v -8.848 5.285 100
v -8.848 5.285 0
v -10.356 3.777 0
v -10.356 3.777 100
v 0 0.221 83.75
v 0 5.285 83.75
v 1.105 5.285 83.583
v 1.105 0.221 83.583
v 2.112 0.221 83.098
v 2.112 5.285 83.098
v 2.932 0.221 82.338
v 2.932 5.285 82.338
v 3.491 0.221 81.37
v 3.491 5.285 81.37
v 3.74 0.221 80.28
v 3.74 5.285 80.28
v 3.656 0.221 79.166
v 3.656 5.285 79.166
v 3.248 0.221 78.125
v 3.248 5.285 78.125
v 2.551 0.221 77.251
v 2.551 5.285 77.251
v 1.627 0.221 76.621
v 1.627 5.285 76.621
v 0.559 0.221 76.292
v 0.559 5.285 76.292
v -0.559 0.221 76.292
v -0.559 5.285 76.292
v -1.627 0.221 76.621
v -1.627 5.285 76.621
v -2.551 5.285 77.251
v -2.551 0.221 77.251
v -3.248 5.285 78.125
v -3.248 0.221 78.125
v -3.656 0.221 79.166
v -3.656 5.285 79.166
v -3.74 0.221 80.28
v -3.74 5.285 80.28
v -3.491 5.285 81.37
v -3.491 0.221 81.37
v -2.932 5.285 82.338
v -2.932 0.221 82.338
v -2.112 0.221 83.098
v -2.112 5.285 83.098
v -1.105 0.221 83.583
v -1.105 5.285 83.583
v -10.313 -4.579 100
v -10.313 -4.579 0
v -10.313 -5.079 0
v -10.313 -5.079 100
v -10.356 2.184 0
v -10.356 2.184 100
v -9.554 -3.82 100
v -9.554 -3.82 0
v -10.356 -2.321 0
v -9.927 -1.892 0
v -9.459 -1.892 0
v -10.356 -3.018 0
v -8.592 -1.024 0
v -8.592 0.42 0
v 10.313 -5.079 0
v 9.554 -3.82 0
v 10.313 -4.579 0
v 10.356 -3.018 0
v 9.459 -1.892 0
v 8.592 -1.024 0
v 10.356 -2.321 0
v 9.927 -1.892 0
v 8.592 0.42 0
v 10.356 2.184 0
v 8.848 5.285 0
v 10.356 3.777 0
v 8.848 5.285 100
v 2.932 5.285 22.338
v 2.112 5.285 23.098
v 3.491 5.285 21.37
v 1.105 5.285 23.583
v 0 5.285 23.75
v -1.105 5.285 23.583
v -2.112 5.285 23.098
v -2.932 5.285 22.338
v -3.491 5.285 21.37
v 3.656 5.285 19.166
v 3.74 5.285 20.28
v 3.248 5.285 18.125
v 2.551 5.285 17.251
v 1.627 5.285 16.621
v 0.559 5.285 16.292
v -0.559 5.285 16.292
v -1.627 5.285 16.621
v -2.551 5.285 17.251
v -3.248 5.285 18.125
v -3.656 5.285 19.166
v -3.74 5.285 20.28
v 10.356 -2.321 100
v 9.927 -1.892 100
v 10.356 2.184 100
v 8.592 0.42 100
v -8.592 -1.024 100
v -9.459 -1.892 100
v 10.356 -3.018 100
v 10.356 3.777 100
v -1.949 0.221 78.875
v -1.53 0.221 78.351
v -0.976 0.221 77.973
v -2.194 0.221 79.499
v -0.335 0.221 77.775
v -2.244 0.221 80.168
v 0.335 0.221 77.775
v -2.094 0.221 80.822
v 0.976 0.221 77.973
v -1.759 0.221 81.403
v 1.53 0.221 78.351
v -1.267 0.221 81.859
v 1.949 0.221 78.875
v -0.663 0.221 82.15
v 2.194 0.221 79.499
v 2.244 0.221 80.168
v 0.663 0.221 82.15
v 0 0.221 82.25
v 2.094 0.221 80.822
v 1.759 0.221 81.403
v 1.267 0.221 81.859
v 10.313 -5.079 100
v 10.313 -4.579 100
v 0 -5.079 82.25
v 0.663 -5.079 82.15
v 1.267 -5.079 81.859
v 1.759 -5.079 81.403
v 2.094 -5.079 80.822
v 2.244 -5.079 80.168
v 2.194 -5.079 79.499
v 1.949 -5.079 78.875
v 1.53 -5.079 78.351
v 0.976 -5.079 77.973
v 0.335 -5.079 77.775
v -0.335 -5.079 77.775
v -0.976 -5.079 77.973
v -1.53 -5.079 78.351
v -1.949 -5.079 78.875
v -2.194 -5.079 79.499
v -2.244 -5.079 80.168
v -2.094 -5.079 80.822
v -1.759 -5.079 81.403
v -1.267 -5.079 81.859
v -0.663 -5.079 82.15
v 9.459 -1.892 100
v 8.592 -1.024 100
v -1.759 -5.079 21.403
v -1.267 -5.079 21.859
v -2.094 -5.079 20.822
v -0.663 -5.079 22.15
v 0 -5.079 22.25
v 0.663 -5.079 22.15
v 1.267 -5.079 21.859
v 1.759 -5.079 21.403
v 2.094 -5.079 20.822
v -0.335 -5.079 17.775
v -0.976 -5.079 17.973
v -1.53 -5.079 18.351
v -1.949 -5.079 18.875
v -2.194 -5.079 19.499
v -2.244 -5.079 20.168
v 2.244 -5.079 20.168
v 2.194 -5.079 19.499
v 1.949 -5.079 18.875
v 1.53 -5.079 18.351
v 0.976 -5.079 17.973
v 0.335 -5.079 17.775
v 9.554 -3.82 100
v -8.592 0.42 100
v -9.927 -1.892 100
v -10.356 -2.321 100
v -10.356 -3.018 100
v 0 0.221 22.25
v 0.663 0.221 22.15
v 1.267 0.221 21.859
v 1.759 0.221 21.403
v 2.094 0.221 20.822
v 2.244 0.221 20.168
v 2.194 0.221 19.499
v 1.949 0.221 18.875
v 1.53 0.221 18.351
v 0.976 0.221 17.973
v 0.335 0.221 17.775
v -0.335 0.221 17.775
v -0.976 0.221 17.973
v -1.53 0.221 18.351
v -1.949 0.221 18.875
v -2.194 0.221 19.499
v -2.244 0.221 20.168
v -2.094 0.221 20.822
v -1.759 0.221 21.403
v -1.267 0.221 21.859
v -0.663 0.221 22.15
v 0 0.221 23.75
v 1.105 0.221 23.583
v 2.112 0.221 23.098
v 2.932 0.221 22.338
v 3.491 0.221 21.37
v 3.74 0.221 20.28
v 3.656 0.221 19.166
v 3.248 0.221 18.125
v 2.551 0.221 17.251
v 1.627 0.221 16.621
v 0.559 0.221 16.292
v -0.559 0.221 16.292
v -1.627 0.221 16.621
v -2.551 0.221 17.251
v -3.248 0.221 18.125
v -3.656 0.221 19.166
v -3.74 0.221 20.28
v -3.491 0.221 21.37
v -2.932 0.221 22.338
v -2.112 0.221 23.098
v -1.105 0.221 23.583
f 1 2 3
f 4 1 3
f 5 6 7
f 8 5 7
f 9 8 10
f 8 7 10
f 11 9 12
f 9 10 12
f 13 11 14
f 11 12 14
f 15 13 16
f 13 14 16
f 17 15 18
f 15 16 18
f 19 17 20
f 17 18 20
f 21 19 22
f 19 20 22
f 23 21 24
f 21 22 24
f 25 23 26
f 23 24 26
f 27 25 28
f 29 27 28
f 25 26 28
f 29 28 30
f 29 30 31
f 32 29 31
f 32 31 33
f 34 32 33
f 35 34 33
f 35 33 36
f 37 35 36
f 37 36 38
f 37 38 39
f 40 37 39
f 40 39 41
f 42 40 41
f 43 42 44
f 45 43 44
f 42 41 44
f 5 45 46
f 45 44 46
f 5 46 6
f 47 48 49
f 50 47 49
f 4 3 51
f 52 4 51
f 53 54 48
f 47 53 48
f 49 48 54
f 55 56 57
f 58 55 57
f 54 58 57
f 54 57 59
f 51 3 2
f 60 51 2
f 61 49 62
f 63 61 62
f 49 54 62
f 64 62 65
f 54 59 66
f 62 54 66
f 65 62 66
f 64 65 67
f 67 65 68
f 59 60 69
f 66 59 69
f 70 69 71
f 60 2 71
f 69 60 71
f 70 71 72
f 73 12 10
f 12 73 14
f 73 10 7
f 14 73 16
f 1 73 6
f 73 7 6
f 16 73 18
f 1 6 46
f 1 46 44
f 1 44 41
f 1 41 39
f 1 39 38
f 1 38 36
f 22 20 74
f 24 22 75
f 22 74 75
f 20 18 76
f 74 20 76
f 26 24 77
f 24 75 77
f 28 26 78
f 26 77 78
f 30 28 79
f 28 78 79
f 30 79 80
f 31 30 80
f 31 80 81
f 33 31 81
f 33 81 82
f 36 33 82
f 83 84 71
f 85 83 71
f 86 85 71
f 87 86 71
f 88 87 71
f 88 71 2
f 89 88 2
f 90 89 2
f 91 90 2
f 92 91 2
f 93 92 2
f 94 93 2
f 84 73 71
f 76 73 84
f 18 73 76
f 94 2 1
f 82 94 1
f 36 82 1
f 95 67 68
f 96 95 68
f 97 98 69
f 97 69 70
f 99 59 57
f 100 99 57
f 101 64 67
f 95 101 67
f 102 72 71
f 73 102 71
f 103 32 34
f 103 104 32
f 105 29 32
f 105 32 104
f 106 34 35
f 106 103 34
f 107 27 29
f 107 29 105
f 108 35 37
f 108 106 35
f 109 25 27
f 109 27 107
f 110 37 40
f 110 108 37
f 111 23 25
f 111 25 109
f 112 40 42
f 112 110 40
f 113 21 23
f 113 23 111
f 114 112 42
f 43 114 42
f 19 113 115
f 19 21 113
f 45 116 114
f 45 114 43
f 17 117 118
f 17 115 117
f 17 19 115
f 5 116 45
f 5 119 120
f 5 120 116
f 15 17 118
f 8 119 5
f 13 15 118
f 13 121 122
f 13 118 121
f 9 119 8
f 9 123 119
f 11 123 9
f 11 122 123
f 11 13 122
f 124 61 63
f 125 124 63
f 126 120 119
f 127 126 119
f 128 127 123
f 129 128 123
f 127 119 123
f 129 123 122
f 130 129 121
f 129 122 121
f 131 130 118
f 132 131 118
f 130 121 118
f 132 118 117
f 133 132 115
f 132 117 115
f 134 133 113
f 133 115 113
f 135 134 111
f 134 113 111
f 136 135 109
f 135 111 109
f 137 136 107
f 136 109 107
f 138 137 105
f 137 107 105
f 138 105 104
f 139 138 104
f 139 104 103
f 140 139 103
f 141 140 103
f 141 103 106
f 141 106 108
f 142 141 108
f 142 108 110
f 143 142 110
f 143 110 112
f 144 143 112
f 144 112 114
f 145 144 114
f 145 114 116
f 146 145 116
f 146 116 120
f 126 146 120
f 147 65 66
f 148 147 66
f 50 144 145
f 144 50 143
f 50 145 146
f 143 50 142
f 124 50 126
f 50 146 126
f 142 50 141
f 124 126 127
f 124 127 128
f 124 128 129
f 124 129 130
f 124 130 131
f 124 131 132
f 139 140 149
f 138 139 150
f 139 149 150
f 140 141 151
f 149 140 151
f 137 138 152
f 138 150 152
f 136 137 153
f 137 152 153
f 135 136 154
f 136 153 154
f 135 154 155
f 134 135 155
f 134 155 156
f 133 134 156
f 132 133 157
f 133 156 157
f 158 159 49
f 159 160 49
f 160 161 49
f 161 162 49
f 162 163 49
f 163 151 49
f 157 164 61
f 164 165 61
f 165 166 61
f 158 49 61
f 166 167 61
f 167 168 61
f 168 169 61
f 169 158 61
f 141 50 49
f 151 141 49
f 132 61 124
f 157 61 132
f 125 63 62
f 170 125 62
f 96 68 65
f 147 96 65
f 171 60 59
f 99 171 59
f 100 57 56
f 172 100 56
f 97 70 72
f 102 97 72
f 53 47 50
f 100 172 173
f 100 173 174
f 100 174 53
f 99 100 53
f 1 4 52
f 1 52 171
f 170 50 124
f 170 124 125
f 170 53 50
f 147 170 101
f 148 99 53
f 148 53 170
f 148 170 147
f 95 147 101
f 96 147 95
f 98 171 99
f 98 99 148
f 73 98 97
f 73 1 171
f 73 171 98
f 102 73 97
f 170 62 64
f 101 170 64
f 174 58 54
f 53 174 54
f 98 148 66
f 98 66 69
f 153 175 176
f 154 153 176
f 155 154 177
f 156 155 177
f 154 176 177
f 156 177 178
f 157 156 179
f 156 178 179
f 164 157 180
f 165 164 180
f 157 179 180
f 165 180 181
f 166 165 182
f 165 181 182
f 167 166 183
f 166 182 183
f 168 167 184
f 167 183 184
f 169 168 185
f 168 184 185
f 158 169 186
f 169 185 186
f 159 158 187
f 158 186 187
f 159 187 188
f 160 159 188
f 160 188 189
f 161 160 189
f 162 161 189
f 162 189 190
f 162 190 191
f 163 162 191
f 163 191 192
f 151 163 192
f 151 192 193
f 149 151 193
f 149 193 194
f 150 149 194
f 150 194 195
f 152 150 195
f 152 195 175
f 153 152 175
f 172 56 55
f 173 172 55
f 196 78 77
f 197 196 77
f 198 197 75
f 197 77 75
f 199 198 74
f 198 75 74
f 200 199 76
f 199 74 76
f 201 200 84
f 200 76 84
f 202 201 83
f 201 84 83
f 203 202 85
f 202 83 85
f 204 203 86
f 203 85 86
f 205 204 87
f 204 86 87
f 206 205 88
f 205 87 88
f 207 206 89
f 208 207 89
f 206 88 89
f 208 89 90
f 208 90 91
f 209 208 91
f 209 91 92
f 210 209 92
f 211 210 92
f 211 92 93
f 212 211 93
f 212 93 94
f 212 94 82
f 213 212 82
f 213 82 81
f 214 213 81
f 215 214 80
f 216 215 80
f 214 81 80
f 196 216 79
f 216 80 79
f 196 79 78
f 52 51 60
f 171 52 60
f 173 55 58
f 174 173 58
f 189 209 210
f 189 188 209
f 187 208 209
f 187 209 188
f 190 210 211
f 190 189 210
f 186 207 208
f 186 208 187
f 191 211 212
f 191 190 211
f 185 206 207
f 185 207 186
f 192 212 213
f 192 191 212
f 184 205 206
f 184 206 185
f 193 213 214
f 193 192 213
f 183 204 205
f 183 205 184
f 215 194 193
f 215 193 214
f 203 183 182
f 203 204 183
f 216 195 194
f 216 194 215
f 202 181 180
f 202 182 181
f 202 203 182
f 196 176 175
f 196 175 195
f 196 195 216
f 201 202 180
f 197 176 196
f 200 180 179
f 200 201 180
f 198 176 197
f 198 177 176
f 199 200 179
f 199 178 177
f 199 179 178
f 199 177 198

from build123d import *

# Parameters (mm, degrees)
BOSS_EXTRUDE1_DEPTH = 100
SKETCH2_R           = 3.75
CUT_EXTRUDE1_DEPTH  = 5.064116728
SKETCH3_R           = 2.25
CUT_EXTRUDE2_DEPTH  = 101.674424562


with BuildPart() as part:
    # Sketch1 → Boss-Extrude1 (new body)
    with BuildSketch(Plane.XY):
        Polygon((-10.313155992, -4.579057074), (-10.313155992, -5.079057074), (10.313155992, -5.079057074), (10.313155992, -4.579057074), (9.554252946, -3.820154028), (10.356146045, -3.018260929), (10.356146045, -2.320637728), (9.927498969, -1.891990652), (9.459466628, -1.891990652), (8.591867013, -1.024391036), (8.591867013, 0.420032401), (10.356146045, 2.184311433), (10.356146045, 3.776726056), (8.847812446, 5.285059654), (-8.847812446, 5.285059654), (-10.356146045, 3.776726056), (-10.356146045, 2.184311433), (-8.591867013, 0.420032401), (-8.591867013, -1.024391036), (-9.459466628, -1.891990652), (-9.927498969, -1.891990652), (-10.356146045, -2.320637728), (-10.356146045, -3.018260929), (-9.554252946, -3.820154028), align=None)
    extrude(amount=BOSS_EXTRUDE1_DEPTH)

    # Sketch2 → Cut-Extrude1 (cut)
    with BuildSketch(Plane(origin=(0, 5.285059654, 0), x_dir=(1, 0, 0), z_dir=(0, 1, 0))):
        with Locations(Location((0, -20, 0), (0, 0, 270))):
            Circle(SKETCH2_R)
        with Locations(Location((0, -80, 0), (0, 0, 270))):
            Circle(SKETCH2_R)
    extrude(amount=-CUT_EXTRUDE1_DEPTH, mode=Mode.SUBTRACT)

    # Sketch3 → Cut-Extrude2 (cut, through all)
    with BuildSketch(Plane(origin=(0, 0.220942926, 0), x_dir=(1, 0, 0), z_dir=(0, 1, 0))):
        with Locations(Location((0, -20, 0), (0, 0, 270))):
            Circle(SKETCH3_R)
        with Locations(Location((0, -80, 0), (0, 0, 270))):
            Circle(SKETCH3_R)
    extrude(amount=-CUT_EXTRUDE2_DEPTH, mode=Mode.SUBTRACT)


solid = part.part
